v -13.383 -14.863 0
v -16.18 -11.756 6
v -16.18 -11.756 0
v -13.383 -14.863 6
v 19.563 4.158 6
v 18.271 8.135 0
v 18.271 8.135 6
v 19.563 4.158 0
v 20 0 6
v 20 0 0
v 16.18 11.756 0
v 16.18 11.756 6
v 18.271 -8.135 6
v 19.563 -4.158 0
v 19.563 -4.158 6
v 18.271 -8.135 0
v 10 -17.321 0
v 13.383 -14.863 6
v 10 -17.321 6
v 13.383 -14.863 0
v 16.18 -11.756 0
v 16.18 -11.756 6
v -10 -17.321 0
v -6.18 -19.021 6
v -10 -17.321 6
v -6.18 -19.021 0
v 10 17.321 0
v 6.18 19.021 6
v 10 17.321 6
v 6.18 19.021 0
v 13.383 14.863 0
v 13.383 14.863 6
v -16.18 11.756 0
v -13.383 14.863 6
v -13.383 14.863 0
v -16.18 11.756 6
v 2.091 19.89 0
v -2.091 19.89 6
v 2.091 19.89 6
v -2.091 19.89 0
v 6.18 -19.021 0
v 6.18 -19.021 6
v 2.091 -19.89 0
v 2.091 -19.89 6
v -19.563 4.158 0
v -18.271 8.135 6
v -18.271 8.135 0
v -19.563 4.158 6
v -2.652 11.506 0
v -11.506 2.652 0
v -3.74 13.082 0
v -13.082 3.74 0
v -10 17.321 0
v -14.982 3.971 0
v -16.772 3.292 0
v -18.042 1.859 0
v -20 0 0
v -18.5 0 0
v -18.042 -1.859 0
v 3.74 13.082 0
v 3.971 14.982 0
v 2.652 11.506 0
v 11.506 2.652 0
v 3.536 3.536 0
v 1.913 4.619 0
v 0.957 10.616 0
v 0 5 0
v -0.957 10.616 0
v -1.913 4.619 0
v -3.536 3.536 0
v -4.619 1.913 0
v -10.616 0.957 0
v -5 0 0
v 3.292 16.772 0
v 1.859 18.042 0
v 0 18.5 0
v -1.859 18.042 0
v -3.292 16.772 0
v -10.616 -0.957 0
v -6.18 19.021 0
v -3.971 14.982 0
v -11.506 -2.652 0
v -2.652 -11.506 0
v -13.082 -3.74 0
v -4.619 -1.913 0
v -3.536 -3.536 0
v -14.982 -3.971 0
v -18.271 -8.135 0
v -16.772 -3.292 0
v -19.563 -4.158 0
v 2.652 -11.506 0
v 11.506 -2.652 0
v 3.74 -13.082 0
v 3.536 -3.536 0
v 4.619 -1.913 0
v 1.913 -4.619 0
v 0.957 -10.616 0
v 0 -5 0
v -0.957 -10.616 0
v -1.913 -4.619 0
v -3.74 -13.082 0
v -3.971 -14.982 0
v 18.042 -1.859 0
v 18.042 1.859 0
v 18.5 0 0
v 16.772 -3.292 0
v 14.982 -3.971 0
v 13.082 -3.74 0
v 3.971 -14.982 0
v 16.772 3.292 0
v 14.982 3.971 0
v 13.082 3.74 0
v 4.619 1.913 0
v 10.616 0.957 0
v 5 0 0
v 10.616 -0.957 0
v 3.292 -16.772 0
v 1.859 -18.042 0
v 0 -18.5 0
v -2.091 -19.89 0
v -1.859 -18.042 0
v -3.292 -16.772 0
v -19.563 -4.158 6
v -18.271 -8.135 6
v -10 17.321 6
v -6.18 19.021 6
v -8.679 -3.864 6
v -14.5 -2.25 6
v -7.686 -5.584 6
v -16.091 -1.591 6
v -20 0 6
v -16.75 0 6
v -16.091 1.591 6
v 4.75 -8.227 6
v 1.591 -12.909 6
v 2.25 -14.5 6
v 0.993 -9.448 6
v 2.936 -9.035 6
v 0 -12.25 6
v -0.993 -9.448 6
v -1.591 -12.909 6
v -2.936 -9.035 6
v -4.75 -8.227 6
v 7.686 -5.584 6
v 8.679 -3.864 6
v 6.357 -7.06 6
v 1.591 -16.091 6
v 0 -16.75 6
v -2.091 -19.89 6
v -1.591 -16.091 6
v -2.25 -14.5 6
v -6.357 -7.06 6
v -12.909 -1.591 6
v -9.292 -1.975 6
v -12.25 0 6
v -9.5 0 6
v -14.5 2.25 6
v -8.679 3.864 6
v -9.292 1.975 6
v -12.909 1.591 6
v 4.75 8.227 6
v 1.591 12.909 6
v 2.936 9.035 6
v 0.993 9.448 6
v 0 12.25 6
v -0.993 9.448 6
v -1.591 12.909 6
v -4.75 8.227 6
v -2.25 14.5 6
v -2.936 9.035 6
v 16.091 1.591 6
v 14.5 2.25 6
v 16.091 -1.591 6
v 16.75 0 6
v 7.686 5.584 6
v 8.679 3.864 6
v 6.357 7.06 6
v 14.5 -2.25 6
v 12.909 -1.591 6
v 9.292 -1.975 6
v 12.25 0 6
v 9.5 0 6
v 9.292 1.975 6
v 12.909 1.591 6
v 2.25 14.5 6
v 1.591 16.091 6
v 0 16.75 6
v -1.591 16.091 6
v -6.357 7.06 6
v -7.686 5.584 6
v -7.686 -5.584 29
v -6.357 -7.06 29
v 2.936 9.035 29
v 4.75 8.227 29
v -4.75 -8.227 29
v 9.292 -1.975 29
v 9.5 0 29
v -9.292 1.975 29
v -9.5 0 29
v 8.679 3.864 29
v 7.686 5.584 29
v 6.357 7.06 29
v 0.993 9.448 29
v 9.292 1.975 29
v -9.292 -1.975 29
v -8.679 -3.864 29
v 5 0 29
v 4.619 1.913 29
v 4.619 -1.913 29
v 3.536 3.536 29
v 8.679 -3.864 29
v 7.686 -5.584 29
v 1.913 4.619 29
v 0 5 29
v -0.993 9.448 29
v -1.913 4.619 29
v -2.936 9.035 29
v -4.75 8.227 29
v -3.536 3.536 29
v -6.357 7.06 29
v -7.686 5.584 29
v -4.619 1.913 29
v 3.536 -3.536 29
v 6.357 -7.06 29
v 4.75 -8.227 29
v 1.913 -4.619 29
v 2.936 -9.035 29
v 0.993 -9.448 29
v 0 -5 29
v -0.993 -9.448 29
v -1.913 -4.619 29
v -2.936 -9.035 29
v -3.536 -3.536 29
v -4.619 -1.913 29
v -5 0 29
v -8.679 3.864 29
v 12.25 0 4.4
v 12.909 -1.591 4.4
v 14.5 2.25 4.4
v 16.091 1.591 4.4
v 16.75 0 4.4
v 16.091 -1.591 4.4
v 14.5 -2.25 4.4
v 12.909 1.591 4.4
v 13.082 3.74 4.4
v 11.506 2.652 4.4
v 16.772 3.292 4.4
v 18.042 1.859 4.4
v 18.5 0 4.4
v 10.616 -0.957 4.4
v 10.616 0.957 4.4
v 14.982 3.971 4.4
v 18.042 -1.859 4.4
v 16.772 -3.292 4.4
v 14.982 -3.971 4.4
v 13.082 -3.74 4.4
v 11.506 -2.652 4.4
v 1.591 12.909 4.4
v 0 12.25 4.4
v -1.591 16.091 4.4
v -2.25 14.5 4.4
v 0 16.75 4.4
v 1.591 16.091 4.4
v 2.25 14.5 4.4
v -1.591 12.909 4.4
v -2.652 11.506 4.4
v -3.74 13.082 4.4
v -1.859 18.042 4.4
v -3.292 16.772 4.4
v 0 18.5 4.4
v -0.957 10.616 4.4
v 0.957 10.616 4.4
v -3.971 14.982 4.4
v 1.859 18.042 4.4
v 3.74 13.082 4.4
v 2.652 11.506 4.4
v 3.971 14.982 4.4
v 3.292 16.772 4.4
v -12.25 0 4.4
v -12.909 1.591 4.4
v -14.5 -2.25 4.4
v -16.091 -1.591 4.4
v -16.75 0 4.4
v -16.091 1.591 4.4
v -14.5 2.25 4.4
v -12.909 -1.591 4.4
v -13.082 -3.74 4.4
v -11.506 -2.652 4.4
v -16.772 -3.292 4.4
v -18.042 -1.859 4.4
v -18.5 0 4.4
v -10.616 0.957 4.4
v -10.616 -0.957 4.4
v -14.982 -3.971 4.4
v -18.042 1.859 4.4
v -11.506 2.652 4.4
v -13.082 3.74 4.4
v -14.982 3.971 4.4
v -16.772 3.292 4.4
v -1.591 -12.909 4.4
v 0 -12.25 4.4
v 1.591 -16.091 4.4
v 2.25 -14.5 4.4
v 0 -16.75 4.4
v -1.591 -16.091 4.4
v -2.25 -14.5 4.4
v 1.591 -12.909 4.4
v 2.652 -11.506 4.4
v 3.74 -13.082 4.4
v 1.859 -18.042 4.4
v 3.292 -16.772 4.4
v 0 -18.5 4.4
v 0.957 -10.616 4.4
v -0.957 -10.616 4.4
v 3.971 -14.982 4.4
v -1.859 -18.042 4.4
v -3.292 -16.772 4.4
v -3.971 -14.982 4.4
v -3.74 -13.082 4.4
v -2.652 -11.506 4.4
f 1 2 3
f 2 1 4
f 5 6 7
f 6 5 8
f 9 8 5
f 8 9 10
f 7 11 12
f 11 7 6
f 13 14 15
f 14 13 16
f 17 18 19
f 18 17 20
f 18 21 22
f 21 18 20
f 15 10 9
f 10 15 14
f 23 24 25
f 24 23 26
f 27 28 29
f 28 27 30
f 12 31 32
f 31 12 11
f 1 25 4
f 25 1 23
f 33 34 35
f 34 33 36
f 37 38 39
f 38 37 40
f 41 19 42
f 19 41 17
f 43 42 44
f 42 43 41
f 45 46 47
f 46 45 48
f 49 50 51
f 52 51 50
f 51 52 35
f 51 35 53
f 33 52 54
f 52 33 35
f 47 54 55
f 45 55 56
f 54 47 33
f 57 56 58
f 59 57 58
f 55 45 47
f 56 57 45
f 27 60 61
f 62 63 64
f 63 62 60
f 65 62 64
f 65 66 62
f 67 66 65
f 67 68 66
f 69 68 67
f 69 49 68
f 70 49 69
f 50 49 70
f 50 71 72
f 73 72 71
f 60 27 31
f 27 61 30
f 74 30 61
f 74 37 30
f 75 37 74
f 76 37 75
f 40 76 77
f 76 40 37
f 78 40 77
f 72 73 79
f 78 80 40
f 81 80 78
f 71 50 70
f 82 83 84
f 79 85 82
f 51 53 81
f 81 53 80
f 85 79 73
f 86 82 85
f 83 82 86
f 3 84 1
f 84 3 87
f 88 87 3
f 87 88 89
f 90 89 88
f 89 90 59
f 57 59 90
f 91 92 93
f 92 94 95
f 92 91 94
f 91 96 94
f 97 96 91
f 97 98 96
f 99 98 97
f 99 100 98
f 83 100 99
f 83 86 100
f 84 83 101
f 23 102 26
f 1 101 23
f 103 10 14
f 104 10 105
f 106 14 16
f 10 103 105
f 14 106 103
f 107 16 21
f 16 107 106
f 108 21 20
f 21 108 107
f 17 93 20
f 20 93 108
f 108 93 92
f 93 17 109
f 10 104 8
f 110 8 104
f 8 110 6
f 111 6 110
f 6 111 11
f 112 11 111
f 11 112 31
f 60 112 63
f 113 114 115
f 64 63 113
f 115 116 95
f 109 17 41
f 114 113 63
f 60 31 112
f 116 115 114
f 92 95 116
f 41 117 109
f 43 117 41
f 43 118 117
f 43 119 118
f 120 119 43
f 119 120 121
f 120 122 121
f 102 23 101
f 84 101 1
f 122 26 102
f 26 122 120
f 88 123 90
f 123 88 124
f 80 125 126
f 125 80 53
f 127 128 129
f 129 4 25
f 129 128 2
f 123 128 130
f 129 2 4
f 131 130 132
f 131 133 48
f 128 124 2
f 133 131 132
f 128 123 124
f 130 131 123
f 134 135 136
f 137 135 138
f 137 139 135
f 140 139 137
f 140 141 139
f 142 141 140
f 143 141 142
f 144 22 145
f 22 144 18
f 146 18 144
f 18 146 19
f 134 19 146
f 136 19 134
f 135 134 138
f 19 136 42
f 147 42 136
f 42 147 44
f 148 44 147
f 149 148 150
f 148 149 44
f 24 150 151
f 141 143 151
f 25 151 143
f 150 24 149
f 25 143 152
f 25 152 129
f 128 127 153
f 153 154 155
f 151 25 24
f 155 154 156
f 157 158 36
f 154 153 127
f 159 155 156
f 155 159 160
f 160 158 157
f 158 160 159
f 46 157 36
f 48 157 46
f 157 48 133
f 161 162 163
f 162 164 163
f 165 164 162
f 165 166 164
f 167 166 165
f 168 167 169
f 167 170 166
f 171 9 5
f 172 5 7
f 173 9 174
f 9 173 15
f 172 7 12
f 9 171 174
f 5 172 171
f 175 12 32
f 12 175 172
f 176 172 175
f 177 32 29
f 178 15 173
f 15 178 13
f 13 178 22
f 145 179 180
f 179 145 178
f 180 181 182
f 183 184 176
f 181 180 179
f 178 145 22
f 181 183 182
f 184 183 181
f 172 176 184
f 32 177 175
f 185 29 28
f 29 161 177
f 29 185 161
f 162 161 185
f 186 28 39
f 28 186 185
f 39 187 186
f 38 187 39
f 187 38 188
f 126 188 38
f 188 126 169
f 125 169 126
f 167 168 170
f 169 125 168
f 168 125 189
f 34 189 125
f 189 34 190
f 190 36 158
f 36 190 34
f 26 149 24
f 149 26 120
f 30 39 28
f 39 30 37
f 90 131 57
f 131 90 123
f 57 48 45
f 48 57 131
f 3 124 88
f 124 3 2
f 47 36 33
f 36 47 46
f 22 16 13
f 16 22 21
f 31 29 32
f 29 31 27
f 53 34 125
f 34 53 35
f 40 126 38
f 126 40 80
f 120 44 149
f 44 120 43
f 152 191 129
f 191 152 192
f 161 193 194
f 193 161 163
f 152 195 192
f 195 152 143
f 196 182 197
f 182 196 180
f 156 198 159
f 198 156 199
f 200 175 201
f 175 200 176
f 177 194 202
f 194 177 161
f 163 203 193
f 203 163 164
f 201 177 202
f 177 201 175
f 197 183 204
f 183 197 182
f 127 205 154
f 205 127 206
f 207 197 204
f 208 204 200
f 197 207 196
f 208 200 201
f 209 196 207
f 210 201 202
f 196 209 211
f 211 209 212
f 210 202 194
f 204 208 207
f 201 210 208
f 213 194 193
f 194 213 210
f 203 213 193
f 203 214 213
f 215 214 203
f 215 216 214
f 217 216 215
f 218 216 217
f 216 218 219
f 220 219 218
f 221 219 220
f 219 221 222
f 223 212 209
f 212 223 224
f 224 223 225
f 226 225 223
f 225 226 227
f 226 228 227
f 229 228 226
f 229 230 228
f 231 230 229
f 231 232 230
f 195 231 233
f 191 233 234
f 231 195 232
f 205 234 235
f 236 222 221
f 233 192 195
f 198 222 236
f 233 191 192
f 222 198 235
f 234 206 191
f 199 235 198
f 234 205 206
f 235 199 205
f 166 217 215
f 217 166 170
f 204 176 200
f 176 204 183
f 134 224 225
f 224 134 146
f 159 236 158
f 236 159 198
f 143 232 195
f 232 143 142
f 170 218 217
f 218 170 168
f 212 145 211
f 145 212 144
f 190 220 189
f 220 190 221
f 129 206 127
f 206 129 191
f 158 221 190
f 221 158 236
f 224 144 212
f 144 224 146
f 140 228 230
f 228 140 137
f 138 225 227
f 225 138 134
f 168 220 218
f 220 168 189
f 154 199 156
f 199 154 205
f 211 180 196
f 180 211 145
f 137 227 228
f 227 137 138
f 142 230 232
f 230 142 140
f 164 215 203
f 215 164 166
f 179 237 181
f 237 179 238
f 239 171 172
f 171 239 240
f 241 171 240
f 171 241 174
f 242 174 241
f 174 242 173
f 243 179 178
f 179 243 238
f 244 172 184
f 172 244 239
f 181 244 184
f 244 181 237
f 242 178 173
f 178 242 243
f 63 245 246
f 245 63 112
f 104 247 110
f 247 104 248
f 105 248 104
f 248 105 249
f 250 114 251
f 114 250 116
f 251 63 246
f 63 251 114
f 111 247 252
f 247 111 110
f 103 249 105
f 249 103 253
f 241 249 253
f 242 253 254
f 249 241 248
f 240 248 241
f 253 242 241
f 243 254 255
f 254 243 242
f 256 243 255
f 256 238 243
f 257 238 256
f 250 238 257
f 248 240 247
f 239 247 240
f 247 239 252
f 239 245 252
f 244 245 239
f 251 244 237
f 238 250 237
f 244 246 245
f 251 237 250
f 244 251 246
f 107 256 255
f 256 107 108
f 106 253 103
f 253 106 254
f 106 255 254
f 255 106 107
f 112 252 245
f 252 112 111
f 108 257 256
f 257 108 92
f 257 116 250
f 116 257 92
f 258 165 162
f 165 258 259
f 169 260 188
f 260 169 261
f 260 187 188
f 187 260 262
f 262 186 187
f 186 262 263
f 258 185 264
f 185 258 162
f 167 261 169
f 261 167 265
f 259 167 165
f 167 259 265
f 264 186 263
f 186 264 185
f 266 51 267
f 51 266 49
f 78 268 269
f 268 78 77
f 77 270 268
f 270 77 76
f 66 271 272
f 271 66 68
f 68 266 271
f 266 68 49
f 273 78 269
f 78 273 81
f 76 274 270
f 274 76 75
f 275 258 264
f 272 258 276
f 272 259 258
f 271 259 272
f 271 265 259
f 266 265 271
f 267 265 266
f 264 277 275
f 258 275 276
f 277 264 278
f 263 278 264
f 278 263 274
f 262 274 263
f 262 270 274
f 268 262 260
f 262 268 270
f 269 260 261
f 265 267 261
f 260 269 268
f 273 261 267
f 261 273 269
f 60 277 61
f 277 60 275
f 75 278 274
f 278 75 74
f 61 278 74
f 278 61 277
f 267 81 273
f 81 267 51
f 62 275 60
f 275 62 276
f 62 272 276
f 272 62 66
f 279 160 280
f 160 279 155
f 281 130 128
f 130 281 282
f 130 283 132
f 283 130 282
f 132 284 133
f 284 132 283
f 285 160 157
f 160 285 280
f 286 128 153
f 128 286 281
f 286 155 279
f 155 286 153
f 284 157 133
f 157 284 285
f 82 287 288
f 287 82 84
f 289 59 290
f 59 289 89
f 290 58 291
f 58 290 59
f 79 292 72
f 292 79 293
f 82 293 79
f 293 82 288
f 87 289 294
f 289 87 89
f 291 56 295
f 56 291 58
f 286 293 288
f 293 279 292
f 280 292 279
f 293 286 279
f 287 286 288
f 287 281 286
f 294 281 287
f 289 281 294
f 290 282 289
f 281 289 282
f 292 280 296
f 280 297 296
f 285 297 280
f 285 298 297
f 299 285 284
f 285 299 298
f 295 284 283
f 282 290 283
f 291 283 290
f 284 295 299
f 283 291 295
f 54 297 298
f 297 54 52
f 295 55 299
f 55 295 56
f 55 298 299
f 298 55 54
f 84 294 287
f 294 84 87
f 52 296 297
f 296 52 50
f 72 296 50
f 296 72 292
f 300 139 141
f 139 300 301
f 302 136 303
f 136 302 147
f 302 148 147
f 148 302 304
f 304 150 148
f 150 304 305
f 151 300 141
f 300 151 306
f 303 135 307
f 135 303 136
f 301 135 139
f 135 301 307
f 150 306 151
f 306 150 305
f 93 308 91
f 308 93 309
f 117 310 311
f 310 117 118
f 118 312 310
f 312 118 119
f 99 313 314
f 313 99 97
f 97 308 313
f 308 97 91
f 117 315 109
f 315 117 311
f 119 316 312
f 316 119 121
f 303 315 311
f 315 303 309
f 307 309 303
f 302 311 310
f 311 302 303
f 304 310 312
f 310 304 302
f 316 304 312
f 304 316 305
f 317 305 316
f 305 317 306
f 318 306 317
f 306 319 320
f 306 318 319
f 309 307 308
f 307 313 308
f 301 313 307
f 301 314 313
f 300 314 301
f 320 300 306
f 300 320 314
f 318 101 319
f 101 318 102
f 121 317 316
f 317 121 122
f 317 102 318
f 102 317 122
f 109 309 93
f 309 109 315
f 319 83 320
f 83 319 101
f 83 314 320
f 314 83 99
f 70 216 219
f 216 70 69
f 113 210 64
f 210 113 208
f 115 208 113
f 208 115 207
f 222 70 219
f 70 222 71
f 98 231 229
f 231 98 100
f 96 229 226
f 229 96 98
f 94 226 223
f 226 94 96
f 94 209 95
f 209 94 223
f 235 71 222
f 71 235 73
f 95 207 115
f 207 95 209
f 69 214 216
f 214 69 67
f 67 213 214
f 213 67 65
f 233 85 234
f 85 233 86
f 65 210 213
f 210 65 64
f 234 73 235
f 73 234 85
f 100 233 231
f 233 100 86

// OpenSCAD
// file: bearing_dims.scad
/*
	bore = v[0];
	outer = v[1];
	len = v[2];
	ring_space = v[3];
	ring_dia = v[4];
	ring_gap = v[5];
*/

linear_bearing_dims = [
	[3,7,10,0,7,0],
	[4,8,12,0,8,0],
	[5,10,15,10.2,9.6,1.1],
	[6,12,19,13.5,11.5,1.1],
	[8,15,24,17.5,14.3,1.1],
	[10,19,29,22,18,1.3],
	[12,21,30,23,20,1.3],
	[13,23,32,23,22,1.3],
	[16,28,37,26.5,27,1.6],
	[20,32,42,30.5,30.5,1.6],
	[25,40,59,41,38,1.85],
	[30,45,64,44.5,43,1.85],
	[35,52,70,49.5,49,2.1],
	[40,60,80,60.5,57,2.1],
	[50,80,100,74,76.5,2.6],
	[60,90,110,85,86.5,3.15],
	[80,120,140,105.5,116,4.15],
	[100,150,150,125.5,145,4.15]
];

/*
	d = v[0];
	h = v[1];
	e = v[2];
	w = v[3];		// overall width
	l = v[4];		// overall length
	f = v[5];
	g = v[6];
	b = v[7];		// screw spacing along width
	c = v[8];		// screw spacing along length
	k = v[9];
	t = v[10];
	s1 = v[11];
	s2 = v[12];
	L1 = v[13];
*/

linear_bearing_block_dims = [
	[6,9,15,30,25,18,15,20,15,5,6,4,3.4,8],
	[8,11,17,34,30,22,18,24,18,5,6,4,3.4,8],
	[10,13,20,40,35,26,21,28,21,6,8,5,4.3,12],
	[12,15,21,42,36,28,24,30.5,26,5.75,8,5,4.3,12],
	[13,15,22,44,39,30,24.5,33,26,5.5,8,5,4.3,12],
	[16,19,25,50,44,38.5,32.5,36,34,7,9,5,4.3,12],
	[20,21,27,54,50,41,35,40,40,7,11,6,5.2,12],
	[25,26,38,76,67,51.5,42,54,50,11,12,8,7,18],
	[30,30,39,78,72,59.5,49,58,58,10,15,8,7,18],
	[35,34,45,90,80,68,54,70,60,10,18,8,7,18],
	[40,40,51,102,90,78,62,80,60,11,20,10,8.7,25],
	[50,52,61,122,110,102,80,100,80,11,25,10,8.7,25],
	[60,58,66,132,122,114,94,108,90,12,30,10,10.7,25]
];

linear_bearing_long_block_dims = [
	[8,11,17,34,59,22,18,24,42,5,6,4,3.4,8],
	[10,13,20,40,68,26,21,28,46,6,8,5,4.3,12],
	[12,15,21,42,70,28,24,30.5,50,5.75,8,5,4.3,12],
	[13,15,22,44,75,30,24.5,33,50,5.5,8,5,4.3,12],
	[16,19,25,50,85,38.5,32.5,36,60,7,9,5,4.3,12],
	[20,21,27,54,96,41,35,40,70,7,11,6,5.2,12],
	[25,26,38,76,130,51.5,42,54,100,11,12,8,7,18],
	[30,30,39,78,140,59.5,49,58,110,10,15,8,7,18],
	[35,34,45,90,155,68,54,70,120,10,18,8,7,18],
	[40,40,51,102,175,78,62,80,140,11,20,10,8.7,25],
];

/*
	d = v[0];
	D = v[1];
	L = v[2];
	D1 = v[3];
	H = v[4];
	pcd = v[5];
	d1 = v[6];
	d2 = v[7];
	h = v[8];
*/

linear_bearing_round_flange_dims = [
	[6,12,19,28,5,20,3.4,6.5,3.3],
	[8,15,24,32,5,24,3.4,6.5,3.3],
	[10,19,29,40,6,29,4.5,8,4.4],
	[12,21,30,42,6,32,4.5,8,4.4],
	[13,23,32,43,6,33,4.5,8,4.4],
	[16,28,37,48,6,38,4.5,8,4.4],
	[20,32,42,54,8,43,5.5,9.5,5.4],
	[25,40,59,62,8,51,5.5,9.5,5.4],
	[30,45,64,74,10,60,6.6,11,6.5],
	[35,52,70,82,10,67,6.6,11,6.5],
	[40,60,80,96,13,78,9,14,8.6],
	[50,80,100,116,13,98,9,14,8.6],
	[60,90,110,134,18,112,11,17.5,10.6]
];

function get_dims_for_shaft_size(shaft_size, dims) = 
	dims[search(shaft_size, dims, 1, 0)[0]];
// main file
include <bearing_dims.scad>;

module draw_linear_bearing_round_flange(v)
{
	d = v[0];
	D = v[1];
	L = v[2];
	D1 = v[3];
	H = v[4];
	pcd = v[5];
	d1 = v[6];
	d2 = v[7];
	h = v[8];

	difference()
	{
		union()
		{
			cylinder(r=D1 / 2, h=H, center=false);
			cylinder(r=D / 2, h=L, center=false);
		}

		translate([0,0,-0.1])
			cylinder(r=d / 2, h=L+0.2, center=false);

		for(i = [0,90,180,270])
		{
			rotate([0,0,i]) translate([pcd / 2,0,0])
			{
				translate([0,0,-0.1])
					cylinder(r=d1 / 2, h=H+0.2, center=false);
				translate([0,0,-0.1])
					cylinder(r=d2 / 2, h=h+0.1, center=false);
			}
		}
	}
}

module linear_bearing_round_flange(shaft_size)
{
	d = get_dims_for_shaft_size(shaft_size, linear_bearing_round_flange_dims);
	draw_linear_bearing_round_flange(d);
}

linear_bearing_round_flange(10);
